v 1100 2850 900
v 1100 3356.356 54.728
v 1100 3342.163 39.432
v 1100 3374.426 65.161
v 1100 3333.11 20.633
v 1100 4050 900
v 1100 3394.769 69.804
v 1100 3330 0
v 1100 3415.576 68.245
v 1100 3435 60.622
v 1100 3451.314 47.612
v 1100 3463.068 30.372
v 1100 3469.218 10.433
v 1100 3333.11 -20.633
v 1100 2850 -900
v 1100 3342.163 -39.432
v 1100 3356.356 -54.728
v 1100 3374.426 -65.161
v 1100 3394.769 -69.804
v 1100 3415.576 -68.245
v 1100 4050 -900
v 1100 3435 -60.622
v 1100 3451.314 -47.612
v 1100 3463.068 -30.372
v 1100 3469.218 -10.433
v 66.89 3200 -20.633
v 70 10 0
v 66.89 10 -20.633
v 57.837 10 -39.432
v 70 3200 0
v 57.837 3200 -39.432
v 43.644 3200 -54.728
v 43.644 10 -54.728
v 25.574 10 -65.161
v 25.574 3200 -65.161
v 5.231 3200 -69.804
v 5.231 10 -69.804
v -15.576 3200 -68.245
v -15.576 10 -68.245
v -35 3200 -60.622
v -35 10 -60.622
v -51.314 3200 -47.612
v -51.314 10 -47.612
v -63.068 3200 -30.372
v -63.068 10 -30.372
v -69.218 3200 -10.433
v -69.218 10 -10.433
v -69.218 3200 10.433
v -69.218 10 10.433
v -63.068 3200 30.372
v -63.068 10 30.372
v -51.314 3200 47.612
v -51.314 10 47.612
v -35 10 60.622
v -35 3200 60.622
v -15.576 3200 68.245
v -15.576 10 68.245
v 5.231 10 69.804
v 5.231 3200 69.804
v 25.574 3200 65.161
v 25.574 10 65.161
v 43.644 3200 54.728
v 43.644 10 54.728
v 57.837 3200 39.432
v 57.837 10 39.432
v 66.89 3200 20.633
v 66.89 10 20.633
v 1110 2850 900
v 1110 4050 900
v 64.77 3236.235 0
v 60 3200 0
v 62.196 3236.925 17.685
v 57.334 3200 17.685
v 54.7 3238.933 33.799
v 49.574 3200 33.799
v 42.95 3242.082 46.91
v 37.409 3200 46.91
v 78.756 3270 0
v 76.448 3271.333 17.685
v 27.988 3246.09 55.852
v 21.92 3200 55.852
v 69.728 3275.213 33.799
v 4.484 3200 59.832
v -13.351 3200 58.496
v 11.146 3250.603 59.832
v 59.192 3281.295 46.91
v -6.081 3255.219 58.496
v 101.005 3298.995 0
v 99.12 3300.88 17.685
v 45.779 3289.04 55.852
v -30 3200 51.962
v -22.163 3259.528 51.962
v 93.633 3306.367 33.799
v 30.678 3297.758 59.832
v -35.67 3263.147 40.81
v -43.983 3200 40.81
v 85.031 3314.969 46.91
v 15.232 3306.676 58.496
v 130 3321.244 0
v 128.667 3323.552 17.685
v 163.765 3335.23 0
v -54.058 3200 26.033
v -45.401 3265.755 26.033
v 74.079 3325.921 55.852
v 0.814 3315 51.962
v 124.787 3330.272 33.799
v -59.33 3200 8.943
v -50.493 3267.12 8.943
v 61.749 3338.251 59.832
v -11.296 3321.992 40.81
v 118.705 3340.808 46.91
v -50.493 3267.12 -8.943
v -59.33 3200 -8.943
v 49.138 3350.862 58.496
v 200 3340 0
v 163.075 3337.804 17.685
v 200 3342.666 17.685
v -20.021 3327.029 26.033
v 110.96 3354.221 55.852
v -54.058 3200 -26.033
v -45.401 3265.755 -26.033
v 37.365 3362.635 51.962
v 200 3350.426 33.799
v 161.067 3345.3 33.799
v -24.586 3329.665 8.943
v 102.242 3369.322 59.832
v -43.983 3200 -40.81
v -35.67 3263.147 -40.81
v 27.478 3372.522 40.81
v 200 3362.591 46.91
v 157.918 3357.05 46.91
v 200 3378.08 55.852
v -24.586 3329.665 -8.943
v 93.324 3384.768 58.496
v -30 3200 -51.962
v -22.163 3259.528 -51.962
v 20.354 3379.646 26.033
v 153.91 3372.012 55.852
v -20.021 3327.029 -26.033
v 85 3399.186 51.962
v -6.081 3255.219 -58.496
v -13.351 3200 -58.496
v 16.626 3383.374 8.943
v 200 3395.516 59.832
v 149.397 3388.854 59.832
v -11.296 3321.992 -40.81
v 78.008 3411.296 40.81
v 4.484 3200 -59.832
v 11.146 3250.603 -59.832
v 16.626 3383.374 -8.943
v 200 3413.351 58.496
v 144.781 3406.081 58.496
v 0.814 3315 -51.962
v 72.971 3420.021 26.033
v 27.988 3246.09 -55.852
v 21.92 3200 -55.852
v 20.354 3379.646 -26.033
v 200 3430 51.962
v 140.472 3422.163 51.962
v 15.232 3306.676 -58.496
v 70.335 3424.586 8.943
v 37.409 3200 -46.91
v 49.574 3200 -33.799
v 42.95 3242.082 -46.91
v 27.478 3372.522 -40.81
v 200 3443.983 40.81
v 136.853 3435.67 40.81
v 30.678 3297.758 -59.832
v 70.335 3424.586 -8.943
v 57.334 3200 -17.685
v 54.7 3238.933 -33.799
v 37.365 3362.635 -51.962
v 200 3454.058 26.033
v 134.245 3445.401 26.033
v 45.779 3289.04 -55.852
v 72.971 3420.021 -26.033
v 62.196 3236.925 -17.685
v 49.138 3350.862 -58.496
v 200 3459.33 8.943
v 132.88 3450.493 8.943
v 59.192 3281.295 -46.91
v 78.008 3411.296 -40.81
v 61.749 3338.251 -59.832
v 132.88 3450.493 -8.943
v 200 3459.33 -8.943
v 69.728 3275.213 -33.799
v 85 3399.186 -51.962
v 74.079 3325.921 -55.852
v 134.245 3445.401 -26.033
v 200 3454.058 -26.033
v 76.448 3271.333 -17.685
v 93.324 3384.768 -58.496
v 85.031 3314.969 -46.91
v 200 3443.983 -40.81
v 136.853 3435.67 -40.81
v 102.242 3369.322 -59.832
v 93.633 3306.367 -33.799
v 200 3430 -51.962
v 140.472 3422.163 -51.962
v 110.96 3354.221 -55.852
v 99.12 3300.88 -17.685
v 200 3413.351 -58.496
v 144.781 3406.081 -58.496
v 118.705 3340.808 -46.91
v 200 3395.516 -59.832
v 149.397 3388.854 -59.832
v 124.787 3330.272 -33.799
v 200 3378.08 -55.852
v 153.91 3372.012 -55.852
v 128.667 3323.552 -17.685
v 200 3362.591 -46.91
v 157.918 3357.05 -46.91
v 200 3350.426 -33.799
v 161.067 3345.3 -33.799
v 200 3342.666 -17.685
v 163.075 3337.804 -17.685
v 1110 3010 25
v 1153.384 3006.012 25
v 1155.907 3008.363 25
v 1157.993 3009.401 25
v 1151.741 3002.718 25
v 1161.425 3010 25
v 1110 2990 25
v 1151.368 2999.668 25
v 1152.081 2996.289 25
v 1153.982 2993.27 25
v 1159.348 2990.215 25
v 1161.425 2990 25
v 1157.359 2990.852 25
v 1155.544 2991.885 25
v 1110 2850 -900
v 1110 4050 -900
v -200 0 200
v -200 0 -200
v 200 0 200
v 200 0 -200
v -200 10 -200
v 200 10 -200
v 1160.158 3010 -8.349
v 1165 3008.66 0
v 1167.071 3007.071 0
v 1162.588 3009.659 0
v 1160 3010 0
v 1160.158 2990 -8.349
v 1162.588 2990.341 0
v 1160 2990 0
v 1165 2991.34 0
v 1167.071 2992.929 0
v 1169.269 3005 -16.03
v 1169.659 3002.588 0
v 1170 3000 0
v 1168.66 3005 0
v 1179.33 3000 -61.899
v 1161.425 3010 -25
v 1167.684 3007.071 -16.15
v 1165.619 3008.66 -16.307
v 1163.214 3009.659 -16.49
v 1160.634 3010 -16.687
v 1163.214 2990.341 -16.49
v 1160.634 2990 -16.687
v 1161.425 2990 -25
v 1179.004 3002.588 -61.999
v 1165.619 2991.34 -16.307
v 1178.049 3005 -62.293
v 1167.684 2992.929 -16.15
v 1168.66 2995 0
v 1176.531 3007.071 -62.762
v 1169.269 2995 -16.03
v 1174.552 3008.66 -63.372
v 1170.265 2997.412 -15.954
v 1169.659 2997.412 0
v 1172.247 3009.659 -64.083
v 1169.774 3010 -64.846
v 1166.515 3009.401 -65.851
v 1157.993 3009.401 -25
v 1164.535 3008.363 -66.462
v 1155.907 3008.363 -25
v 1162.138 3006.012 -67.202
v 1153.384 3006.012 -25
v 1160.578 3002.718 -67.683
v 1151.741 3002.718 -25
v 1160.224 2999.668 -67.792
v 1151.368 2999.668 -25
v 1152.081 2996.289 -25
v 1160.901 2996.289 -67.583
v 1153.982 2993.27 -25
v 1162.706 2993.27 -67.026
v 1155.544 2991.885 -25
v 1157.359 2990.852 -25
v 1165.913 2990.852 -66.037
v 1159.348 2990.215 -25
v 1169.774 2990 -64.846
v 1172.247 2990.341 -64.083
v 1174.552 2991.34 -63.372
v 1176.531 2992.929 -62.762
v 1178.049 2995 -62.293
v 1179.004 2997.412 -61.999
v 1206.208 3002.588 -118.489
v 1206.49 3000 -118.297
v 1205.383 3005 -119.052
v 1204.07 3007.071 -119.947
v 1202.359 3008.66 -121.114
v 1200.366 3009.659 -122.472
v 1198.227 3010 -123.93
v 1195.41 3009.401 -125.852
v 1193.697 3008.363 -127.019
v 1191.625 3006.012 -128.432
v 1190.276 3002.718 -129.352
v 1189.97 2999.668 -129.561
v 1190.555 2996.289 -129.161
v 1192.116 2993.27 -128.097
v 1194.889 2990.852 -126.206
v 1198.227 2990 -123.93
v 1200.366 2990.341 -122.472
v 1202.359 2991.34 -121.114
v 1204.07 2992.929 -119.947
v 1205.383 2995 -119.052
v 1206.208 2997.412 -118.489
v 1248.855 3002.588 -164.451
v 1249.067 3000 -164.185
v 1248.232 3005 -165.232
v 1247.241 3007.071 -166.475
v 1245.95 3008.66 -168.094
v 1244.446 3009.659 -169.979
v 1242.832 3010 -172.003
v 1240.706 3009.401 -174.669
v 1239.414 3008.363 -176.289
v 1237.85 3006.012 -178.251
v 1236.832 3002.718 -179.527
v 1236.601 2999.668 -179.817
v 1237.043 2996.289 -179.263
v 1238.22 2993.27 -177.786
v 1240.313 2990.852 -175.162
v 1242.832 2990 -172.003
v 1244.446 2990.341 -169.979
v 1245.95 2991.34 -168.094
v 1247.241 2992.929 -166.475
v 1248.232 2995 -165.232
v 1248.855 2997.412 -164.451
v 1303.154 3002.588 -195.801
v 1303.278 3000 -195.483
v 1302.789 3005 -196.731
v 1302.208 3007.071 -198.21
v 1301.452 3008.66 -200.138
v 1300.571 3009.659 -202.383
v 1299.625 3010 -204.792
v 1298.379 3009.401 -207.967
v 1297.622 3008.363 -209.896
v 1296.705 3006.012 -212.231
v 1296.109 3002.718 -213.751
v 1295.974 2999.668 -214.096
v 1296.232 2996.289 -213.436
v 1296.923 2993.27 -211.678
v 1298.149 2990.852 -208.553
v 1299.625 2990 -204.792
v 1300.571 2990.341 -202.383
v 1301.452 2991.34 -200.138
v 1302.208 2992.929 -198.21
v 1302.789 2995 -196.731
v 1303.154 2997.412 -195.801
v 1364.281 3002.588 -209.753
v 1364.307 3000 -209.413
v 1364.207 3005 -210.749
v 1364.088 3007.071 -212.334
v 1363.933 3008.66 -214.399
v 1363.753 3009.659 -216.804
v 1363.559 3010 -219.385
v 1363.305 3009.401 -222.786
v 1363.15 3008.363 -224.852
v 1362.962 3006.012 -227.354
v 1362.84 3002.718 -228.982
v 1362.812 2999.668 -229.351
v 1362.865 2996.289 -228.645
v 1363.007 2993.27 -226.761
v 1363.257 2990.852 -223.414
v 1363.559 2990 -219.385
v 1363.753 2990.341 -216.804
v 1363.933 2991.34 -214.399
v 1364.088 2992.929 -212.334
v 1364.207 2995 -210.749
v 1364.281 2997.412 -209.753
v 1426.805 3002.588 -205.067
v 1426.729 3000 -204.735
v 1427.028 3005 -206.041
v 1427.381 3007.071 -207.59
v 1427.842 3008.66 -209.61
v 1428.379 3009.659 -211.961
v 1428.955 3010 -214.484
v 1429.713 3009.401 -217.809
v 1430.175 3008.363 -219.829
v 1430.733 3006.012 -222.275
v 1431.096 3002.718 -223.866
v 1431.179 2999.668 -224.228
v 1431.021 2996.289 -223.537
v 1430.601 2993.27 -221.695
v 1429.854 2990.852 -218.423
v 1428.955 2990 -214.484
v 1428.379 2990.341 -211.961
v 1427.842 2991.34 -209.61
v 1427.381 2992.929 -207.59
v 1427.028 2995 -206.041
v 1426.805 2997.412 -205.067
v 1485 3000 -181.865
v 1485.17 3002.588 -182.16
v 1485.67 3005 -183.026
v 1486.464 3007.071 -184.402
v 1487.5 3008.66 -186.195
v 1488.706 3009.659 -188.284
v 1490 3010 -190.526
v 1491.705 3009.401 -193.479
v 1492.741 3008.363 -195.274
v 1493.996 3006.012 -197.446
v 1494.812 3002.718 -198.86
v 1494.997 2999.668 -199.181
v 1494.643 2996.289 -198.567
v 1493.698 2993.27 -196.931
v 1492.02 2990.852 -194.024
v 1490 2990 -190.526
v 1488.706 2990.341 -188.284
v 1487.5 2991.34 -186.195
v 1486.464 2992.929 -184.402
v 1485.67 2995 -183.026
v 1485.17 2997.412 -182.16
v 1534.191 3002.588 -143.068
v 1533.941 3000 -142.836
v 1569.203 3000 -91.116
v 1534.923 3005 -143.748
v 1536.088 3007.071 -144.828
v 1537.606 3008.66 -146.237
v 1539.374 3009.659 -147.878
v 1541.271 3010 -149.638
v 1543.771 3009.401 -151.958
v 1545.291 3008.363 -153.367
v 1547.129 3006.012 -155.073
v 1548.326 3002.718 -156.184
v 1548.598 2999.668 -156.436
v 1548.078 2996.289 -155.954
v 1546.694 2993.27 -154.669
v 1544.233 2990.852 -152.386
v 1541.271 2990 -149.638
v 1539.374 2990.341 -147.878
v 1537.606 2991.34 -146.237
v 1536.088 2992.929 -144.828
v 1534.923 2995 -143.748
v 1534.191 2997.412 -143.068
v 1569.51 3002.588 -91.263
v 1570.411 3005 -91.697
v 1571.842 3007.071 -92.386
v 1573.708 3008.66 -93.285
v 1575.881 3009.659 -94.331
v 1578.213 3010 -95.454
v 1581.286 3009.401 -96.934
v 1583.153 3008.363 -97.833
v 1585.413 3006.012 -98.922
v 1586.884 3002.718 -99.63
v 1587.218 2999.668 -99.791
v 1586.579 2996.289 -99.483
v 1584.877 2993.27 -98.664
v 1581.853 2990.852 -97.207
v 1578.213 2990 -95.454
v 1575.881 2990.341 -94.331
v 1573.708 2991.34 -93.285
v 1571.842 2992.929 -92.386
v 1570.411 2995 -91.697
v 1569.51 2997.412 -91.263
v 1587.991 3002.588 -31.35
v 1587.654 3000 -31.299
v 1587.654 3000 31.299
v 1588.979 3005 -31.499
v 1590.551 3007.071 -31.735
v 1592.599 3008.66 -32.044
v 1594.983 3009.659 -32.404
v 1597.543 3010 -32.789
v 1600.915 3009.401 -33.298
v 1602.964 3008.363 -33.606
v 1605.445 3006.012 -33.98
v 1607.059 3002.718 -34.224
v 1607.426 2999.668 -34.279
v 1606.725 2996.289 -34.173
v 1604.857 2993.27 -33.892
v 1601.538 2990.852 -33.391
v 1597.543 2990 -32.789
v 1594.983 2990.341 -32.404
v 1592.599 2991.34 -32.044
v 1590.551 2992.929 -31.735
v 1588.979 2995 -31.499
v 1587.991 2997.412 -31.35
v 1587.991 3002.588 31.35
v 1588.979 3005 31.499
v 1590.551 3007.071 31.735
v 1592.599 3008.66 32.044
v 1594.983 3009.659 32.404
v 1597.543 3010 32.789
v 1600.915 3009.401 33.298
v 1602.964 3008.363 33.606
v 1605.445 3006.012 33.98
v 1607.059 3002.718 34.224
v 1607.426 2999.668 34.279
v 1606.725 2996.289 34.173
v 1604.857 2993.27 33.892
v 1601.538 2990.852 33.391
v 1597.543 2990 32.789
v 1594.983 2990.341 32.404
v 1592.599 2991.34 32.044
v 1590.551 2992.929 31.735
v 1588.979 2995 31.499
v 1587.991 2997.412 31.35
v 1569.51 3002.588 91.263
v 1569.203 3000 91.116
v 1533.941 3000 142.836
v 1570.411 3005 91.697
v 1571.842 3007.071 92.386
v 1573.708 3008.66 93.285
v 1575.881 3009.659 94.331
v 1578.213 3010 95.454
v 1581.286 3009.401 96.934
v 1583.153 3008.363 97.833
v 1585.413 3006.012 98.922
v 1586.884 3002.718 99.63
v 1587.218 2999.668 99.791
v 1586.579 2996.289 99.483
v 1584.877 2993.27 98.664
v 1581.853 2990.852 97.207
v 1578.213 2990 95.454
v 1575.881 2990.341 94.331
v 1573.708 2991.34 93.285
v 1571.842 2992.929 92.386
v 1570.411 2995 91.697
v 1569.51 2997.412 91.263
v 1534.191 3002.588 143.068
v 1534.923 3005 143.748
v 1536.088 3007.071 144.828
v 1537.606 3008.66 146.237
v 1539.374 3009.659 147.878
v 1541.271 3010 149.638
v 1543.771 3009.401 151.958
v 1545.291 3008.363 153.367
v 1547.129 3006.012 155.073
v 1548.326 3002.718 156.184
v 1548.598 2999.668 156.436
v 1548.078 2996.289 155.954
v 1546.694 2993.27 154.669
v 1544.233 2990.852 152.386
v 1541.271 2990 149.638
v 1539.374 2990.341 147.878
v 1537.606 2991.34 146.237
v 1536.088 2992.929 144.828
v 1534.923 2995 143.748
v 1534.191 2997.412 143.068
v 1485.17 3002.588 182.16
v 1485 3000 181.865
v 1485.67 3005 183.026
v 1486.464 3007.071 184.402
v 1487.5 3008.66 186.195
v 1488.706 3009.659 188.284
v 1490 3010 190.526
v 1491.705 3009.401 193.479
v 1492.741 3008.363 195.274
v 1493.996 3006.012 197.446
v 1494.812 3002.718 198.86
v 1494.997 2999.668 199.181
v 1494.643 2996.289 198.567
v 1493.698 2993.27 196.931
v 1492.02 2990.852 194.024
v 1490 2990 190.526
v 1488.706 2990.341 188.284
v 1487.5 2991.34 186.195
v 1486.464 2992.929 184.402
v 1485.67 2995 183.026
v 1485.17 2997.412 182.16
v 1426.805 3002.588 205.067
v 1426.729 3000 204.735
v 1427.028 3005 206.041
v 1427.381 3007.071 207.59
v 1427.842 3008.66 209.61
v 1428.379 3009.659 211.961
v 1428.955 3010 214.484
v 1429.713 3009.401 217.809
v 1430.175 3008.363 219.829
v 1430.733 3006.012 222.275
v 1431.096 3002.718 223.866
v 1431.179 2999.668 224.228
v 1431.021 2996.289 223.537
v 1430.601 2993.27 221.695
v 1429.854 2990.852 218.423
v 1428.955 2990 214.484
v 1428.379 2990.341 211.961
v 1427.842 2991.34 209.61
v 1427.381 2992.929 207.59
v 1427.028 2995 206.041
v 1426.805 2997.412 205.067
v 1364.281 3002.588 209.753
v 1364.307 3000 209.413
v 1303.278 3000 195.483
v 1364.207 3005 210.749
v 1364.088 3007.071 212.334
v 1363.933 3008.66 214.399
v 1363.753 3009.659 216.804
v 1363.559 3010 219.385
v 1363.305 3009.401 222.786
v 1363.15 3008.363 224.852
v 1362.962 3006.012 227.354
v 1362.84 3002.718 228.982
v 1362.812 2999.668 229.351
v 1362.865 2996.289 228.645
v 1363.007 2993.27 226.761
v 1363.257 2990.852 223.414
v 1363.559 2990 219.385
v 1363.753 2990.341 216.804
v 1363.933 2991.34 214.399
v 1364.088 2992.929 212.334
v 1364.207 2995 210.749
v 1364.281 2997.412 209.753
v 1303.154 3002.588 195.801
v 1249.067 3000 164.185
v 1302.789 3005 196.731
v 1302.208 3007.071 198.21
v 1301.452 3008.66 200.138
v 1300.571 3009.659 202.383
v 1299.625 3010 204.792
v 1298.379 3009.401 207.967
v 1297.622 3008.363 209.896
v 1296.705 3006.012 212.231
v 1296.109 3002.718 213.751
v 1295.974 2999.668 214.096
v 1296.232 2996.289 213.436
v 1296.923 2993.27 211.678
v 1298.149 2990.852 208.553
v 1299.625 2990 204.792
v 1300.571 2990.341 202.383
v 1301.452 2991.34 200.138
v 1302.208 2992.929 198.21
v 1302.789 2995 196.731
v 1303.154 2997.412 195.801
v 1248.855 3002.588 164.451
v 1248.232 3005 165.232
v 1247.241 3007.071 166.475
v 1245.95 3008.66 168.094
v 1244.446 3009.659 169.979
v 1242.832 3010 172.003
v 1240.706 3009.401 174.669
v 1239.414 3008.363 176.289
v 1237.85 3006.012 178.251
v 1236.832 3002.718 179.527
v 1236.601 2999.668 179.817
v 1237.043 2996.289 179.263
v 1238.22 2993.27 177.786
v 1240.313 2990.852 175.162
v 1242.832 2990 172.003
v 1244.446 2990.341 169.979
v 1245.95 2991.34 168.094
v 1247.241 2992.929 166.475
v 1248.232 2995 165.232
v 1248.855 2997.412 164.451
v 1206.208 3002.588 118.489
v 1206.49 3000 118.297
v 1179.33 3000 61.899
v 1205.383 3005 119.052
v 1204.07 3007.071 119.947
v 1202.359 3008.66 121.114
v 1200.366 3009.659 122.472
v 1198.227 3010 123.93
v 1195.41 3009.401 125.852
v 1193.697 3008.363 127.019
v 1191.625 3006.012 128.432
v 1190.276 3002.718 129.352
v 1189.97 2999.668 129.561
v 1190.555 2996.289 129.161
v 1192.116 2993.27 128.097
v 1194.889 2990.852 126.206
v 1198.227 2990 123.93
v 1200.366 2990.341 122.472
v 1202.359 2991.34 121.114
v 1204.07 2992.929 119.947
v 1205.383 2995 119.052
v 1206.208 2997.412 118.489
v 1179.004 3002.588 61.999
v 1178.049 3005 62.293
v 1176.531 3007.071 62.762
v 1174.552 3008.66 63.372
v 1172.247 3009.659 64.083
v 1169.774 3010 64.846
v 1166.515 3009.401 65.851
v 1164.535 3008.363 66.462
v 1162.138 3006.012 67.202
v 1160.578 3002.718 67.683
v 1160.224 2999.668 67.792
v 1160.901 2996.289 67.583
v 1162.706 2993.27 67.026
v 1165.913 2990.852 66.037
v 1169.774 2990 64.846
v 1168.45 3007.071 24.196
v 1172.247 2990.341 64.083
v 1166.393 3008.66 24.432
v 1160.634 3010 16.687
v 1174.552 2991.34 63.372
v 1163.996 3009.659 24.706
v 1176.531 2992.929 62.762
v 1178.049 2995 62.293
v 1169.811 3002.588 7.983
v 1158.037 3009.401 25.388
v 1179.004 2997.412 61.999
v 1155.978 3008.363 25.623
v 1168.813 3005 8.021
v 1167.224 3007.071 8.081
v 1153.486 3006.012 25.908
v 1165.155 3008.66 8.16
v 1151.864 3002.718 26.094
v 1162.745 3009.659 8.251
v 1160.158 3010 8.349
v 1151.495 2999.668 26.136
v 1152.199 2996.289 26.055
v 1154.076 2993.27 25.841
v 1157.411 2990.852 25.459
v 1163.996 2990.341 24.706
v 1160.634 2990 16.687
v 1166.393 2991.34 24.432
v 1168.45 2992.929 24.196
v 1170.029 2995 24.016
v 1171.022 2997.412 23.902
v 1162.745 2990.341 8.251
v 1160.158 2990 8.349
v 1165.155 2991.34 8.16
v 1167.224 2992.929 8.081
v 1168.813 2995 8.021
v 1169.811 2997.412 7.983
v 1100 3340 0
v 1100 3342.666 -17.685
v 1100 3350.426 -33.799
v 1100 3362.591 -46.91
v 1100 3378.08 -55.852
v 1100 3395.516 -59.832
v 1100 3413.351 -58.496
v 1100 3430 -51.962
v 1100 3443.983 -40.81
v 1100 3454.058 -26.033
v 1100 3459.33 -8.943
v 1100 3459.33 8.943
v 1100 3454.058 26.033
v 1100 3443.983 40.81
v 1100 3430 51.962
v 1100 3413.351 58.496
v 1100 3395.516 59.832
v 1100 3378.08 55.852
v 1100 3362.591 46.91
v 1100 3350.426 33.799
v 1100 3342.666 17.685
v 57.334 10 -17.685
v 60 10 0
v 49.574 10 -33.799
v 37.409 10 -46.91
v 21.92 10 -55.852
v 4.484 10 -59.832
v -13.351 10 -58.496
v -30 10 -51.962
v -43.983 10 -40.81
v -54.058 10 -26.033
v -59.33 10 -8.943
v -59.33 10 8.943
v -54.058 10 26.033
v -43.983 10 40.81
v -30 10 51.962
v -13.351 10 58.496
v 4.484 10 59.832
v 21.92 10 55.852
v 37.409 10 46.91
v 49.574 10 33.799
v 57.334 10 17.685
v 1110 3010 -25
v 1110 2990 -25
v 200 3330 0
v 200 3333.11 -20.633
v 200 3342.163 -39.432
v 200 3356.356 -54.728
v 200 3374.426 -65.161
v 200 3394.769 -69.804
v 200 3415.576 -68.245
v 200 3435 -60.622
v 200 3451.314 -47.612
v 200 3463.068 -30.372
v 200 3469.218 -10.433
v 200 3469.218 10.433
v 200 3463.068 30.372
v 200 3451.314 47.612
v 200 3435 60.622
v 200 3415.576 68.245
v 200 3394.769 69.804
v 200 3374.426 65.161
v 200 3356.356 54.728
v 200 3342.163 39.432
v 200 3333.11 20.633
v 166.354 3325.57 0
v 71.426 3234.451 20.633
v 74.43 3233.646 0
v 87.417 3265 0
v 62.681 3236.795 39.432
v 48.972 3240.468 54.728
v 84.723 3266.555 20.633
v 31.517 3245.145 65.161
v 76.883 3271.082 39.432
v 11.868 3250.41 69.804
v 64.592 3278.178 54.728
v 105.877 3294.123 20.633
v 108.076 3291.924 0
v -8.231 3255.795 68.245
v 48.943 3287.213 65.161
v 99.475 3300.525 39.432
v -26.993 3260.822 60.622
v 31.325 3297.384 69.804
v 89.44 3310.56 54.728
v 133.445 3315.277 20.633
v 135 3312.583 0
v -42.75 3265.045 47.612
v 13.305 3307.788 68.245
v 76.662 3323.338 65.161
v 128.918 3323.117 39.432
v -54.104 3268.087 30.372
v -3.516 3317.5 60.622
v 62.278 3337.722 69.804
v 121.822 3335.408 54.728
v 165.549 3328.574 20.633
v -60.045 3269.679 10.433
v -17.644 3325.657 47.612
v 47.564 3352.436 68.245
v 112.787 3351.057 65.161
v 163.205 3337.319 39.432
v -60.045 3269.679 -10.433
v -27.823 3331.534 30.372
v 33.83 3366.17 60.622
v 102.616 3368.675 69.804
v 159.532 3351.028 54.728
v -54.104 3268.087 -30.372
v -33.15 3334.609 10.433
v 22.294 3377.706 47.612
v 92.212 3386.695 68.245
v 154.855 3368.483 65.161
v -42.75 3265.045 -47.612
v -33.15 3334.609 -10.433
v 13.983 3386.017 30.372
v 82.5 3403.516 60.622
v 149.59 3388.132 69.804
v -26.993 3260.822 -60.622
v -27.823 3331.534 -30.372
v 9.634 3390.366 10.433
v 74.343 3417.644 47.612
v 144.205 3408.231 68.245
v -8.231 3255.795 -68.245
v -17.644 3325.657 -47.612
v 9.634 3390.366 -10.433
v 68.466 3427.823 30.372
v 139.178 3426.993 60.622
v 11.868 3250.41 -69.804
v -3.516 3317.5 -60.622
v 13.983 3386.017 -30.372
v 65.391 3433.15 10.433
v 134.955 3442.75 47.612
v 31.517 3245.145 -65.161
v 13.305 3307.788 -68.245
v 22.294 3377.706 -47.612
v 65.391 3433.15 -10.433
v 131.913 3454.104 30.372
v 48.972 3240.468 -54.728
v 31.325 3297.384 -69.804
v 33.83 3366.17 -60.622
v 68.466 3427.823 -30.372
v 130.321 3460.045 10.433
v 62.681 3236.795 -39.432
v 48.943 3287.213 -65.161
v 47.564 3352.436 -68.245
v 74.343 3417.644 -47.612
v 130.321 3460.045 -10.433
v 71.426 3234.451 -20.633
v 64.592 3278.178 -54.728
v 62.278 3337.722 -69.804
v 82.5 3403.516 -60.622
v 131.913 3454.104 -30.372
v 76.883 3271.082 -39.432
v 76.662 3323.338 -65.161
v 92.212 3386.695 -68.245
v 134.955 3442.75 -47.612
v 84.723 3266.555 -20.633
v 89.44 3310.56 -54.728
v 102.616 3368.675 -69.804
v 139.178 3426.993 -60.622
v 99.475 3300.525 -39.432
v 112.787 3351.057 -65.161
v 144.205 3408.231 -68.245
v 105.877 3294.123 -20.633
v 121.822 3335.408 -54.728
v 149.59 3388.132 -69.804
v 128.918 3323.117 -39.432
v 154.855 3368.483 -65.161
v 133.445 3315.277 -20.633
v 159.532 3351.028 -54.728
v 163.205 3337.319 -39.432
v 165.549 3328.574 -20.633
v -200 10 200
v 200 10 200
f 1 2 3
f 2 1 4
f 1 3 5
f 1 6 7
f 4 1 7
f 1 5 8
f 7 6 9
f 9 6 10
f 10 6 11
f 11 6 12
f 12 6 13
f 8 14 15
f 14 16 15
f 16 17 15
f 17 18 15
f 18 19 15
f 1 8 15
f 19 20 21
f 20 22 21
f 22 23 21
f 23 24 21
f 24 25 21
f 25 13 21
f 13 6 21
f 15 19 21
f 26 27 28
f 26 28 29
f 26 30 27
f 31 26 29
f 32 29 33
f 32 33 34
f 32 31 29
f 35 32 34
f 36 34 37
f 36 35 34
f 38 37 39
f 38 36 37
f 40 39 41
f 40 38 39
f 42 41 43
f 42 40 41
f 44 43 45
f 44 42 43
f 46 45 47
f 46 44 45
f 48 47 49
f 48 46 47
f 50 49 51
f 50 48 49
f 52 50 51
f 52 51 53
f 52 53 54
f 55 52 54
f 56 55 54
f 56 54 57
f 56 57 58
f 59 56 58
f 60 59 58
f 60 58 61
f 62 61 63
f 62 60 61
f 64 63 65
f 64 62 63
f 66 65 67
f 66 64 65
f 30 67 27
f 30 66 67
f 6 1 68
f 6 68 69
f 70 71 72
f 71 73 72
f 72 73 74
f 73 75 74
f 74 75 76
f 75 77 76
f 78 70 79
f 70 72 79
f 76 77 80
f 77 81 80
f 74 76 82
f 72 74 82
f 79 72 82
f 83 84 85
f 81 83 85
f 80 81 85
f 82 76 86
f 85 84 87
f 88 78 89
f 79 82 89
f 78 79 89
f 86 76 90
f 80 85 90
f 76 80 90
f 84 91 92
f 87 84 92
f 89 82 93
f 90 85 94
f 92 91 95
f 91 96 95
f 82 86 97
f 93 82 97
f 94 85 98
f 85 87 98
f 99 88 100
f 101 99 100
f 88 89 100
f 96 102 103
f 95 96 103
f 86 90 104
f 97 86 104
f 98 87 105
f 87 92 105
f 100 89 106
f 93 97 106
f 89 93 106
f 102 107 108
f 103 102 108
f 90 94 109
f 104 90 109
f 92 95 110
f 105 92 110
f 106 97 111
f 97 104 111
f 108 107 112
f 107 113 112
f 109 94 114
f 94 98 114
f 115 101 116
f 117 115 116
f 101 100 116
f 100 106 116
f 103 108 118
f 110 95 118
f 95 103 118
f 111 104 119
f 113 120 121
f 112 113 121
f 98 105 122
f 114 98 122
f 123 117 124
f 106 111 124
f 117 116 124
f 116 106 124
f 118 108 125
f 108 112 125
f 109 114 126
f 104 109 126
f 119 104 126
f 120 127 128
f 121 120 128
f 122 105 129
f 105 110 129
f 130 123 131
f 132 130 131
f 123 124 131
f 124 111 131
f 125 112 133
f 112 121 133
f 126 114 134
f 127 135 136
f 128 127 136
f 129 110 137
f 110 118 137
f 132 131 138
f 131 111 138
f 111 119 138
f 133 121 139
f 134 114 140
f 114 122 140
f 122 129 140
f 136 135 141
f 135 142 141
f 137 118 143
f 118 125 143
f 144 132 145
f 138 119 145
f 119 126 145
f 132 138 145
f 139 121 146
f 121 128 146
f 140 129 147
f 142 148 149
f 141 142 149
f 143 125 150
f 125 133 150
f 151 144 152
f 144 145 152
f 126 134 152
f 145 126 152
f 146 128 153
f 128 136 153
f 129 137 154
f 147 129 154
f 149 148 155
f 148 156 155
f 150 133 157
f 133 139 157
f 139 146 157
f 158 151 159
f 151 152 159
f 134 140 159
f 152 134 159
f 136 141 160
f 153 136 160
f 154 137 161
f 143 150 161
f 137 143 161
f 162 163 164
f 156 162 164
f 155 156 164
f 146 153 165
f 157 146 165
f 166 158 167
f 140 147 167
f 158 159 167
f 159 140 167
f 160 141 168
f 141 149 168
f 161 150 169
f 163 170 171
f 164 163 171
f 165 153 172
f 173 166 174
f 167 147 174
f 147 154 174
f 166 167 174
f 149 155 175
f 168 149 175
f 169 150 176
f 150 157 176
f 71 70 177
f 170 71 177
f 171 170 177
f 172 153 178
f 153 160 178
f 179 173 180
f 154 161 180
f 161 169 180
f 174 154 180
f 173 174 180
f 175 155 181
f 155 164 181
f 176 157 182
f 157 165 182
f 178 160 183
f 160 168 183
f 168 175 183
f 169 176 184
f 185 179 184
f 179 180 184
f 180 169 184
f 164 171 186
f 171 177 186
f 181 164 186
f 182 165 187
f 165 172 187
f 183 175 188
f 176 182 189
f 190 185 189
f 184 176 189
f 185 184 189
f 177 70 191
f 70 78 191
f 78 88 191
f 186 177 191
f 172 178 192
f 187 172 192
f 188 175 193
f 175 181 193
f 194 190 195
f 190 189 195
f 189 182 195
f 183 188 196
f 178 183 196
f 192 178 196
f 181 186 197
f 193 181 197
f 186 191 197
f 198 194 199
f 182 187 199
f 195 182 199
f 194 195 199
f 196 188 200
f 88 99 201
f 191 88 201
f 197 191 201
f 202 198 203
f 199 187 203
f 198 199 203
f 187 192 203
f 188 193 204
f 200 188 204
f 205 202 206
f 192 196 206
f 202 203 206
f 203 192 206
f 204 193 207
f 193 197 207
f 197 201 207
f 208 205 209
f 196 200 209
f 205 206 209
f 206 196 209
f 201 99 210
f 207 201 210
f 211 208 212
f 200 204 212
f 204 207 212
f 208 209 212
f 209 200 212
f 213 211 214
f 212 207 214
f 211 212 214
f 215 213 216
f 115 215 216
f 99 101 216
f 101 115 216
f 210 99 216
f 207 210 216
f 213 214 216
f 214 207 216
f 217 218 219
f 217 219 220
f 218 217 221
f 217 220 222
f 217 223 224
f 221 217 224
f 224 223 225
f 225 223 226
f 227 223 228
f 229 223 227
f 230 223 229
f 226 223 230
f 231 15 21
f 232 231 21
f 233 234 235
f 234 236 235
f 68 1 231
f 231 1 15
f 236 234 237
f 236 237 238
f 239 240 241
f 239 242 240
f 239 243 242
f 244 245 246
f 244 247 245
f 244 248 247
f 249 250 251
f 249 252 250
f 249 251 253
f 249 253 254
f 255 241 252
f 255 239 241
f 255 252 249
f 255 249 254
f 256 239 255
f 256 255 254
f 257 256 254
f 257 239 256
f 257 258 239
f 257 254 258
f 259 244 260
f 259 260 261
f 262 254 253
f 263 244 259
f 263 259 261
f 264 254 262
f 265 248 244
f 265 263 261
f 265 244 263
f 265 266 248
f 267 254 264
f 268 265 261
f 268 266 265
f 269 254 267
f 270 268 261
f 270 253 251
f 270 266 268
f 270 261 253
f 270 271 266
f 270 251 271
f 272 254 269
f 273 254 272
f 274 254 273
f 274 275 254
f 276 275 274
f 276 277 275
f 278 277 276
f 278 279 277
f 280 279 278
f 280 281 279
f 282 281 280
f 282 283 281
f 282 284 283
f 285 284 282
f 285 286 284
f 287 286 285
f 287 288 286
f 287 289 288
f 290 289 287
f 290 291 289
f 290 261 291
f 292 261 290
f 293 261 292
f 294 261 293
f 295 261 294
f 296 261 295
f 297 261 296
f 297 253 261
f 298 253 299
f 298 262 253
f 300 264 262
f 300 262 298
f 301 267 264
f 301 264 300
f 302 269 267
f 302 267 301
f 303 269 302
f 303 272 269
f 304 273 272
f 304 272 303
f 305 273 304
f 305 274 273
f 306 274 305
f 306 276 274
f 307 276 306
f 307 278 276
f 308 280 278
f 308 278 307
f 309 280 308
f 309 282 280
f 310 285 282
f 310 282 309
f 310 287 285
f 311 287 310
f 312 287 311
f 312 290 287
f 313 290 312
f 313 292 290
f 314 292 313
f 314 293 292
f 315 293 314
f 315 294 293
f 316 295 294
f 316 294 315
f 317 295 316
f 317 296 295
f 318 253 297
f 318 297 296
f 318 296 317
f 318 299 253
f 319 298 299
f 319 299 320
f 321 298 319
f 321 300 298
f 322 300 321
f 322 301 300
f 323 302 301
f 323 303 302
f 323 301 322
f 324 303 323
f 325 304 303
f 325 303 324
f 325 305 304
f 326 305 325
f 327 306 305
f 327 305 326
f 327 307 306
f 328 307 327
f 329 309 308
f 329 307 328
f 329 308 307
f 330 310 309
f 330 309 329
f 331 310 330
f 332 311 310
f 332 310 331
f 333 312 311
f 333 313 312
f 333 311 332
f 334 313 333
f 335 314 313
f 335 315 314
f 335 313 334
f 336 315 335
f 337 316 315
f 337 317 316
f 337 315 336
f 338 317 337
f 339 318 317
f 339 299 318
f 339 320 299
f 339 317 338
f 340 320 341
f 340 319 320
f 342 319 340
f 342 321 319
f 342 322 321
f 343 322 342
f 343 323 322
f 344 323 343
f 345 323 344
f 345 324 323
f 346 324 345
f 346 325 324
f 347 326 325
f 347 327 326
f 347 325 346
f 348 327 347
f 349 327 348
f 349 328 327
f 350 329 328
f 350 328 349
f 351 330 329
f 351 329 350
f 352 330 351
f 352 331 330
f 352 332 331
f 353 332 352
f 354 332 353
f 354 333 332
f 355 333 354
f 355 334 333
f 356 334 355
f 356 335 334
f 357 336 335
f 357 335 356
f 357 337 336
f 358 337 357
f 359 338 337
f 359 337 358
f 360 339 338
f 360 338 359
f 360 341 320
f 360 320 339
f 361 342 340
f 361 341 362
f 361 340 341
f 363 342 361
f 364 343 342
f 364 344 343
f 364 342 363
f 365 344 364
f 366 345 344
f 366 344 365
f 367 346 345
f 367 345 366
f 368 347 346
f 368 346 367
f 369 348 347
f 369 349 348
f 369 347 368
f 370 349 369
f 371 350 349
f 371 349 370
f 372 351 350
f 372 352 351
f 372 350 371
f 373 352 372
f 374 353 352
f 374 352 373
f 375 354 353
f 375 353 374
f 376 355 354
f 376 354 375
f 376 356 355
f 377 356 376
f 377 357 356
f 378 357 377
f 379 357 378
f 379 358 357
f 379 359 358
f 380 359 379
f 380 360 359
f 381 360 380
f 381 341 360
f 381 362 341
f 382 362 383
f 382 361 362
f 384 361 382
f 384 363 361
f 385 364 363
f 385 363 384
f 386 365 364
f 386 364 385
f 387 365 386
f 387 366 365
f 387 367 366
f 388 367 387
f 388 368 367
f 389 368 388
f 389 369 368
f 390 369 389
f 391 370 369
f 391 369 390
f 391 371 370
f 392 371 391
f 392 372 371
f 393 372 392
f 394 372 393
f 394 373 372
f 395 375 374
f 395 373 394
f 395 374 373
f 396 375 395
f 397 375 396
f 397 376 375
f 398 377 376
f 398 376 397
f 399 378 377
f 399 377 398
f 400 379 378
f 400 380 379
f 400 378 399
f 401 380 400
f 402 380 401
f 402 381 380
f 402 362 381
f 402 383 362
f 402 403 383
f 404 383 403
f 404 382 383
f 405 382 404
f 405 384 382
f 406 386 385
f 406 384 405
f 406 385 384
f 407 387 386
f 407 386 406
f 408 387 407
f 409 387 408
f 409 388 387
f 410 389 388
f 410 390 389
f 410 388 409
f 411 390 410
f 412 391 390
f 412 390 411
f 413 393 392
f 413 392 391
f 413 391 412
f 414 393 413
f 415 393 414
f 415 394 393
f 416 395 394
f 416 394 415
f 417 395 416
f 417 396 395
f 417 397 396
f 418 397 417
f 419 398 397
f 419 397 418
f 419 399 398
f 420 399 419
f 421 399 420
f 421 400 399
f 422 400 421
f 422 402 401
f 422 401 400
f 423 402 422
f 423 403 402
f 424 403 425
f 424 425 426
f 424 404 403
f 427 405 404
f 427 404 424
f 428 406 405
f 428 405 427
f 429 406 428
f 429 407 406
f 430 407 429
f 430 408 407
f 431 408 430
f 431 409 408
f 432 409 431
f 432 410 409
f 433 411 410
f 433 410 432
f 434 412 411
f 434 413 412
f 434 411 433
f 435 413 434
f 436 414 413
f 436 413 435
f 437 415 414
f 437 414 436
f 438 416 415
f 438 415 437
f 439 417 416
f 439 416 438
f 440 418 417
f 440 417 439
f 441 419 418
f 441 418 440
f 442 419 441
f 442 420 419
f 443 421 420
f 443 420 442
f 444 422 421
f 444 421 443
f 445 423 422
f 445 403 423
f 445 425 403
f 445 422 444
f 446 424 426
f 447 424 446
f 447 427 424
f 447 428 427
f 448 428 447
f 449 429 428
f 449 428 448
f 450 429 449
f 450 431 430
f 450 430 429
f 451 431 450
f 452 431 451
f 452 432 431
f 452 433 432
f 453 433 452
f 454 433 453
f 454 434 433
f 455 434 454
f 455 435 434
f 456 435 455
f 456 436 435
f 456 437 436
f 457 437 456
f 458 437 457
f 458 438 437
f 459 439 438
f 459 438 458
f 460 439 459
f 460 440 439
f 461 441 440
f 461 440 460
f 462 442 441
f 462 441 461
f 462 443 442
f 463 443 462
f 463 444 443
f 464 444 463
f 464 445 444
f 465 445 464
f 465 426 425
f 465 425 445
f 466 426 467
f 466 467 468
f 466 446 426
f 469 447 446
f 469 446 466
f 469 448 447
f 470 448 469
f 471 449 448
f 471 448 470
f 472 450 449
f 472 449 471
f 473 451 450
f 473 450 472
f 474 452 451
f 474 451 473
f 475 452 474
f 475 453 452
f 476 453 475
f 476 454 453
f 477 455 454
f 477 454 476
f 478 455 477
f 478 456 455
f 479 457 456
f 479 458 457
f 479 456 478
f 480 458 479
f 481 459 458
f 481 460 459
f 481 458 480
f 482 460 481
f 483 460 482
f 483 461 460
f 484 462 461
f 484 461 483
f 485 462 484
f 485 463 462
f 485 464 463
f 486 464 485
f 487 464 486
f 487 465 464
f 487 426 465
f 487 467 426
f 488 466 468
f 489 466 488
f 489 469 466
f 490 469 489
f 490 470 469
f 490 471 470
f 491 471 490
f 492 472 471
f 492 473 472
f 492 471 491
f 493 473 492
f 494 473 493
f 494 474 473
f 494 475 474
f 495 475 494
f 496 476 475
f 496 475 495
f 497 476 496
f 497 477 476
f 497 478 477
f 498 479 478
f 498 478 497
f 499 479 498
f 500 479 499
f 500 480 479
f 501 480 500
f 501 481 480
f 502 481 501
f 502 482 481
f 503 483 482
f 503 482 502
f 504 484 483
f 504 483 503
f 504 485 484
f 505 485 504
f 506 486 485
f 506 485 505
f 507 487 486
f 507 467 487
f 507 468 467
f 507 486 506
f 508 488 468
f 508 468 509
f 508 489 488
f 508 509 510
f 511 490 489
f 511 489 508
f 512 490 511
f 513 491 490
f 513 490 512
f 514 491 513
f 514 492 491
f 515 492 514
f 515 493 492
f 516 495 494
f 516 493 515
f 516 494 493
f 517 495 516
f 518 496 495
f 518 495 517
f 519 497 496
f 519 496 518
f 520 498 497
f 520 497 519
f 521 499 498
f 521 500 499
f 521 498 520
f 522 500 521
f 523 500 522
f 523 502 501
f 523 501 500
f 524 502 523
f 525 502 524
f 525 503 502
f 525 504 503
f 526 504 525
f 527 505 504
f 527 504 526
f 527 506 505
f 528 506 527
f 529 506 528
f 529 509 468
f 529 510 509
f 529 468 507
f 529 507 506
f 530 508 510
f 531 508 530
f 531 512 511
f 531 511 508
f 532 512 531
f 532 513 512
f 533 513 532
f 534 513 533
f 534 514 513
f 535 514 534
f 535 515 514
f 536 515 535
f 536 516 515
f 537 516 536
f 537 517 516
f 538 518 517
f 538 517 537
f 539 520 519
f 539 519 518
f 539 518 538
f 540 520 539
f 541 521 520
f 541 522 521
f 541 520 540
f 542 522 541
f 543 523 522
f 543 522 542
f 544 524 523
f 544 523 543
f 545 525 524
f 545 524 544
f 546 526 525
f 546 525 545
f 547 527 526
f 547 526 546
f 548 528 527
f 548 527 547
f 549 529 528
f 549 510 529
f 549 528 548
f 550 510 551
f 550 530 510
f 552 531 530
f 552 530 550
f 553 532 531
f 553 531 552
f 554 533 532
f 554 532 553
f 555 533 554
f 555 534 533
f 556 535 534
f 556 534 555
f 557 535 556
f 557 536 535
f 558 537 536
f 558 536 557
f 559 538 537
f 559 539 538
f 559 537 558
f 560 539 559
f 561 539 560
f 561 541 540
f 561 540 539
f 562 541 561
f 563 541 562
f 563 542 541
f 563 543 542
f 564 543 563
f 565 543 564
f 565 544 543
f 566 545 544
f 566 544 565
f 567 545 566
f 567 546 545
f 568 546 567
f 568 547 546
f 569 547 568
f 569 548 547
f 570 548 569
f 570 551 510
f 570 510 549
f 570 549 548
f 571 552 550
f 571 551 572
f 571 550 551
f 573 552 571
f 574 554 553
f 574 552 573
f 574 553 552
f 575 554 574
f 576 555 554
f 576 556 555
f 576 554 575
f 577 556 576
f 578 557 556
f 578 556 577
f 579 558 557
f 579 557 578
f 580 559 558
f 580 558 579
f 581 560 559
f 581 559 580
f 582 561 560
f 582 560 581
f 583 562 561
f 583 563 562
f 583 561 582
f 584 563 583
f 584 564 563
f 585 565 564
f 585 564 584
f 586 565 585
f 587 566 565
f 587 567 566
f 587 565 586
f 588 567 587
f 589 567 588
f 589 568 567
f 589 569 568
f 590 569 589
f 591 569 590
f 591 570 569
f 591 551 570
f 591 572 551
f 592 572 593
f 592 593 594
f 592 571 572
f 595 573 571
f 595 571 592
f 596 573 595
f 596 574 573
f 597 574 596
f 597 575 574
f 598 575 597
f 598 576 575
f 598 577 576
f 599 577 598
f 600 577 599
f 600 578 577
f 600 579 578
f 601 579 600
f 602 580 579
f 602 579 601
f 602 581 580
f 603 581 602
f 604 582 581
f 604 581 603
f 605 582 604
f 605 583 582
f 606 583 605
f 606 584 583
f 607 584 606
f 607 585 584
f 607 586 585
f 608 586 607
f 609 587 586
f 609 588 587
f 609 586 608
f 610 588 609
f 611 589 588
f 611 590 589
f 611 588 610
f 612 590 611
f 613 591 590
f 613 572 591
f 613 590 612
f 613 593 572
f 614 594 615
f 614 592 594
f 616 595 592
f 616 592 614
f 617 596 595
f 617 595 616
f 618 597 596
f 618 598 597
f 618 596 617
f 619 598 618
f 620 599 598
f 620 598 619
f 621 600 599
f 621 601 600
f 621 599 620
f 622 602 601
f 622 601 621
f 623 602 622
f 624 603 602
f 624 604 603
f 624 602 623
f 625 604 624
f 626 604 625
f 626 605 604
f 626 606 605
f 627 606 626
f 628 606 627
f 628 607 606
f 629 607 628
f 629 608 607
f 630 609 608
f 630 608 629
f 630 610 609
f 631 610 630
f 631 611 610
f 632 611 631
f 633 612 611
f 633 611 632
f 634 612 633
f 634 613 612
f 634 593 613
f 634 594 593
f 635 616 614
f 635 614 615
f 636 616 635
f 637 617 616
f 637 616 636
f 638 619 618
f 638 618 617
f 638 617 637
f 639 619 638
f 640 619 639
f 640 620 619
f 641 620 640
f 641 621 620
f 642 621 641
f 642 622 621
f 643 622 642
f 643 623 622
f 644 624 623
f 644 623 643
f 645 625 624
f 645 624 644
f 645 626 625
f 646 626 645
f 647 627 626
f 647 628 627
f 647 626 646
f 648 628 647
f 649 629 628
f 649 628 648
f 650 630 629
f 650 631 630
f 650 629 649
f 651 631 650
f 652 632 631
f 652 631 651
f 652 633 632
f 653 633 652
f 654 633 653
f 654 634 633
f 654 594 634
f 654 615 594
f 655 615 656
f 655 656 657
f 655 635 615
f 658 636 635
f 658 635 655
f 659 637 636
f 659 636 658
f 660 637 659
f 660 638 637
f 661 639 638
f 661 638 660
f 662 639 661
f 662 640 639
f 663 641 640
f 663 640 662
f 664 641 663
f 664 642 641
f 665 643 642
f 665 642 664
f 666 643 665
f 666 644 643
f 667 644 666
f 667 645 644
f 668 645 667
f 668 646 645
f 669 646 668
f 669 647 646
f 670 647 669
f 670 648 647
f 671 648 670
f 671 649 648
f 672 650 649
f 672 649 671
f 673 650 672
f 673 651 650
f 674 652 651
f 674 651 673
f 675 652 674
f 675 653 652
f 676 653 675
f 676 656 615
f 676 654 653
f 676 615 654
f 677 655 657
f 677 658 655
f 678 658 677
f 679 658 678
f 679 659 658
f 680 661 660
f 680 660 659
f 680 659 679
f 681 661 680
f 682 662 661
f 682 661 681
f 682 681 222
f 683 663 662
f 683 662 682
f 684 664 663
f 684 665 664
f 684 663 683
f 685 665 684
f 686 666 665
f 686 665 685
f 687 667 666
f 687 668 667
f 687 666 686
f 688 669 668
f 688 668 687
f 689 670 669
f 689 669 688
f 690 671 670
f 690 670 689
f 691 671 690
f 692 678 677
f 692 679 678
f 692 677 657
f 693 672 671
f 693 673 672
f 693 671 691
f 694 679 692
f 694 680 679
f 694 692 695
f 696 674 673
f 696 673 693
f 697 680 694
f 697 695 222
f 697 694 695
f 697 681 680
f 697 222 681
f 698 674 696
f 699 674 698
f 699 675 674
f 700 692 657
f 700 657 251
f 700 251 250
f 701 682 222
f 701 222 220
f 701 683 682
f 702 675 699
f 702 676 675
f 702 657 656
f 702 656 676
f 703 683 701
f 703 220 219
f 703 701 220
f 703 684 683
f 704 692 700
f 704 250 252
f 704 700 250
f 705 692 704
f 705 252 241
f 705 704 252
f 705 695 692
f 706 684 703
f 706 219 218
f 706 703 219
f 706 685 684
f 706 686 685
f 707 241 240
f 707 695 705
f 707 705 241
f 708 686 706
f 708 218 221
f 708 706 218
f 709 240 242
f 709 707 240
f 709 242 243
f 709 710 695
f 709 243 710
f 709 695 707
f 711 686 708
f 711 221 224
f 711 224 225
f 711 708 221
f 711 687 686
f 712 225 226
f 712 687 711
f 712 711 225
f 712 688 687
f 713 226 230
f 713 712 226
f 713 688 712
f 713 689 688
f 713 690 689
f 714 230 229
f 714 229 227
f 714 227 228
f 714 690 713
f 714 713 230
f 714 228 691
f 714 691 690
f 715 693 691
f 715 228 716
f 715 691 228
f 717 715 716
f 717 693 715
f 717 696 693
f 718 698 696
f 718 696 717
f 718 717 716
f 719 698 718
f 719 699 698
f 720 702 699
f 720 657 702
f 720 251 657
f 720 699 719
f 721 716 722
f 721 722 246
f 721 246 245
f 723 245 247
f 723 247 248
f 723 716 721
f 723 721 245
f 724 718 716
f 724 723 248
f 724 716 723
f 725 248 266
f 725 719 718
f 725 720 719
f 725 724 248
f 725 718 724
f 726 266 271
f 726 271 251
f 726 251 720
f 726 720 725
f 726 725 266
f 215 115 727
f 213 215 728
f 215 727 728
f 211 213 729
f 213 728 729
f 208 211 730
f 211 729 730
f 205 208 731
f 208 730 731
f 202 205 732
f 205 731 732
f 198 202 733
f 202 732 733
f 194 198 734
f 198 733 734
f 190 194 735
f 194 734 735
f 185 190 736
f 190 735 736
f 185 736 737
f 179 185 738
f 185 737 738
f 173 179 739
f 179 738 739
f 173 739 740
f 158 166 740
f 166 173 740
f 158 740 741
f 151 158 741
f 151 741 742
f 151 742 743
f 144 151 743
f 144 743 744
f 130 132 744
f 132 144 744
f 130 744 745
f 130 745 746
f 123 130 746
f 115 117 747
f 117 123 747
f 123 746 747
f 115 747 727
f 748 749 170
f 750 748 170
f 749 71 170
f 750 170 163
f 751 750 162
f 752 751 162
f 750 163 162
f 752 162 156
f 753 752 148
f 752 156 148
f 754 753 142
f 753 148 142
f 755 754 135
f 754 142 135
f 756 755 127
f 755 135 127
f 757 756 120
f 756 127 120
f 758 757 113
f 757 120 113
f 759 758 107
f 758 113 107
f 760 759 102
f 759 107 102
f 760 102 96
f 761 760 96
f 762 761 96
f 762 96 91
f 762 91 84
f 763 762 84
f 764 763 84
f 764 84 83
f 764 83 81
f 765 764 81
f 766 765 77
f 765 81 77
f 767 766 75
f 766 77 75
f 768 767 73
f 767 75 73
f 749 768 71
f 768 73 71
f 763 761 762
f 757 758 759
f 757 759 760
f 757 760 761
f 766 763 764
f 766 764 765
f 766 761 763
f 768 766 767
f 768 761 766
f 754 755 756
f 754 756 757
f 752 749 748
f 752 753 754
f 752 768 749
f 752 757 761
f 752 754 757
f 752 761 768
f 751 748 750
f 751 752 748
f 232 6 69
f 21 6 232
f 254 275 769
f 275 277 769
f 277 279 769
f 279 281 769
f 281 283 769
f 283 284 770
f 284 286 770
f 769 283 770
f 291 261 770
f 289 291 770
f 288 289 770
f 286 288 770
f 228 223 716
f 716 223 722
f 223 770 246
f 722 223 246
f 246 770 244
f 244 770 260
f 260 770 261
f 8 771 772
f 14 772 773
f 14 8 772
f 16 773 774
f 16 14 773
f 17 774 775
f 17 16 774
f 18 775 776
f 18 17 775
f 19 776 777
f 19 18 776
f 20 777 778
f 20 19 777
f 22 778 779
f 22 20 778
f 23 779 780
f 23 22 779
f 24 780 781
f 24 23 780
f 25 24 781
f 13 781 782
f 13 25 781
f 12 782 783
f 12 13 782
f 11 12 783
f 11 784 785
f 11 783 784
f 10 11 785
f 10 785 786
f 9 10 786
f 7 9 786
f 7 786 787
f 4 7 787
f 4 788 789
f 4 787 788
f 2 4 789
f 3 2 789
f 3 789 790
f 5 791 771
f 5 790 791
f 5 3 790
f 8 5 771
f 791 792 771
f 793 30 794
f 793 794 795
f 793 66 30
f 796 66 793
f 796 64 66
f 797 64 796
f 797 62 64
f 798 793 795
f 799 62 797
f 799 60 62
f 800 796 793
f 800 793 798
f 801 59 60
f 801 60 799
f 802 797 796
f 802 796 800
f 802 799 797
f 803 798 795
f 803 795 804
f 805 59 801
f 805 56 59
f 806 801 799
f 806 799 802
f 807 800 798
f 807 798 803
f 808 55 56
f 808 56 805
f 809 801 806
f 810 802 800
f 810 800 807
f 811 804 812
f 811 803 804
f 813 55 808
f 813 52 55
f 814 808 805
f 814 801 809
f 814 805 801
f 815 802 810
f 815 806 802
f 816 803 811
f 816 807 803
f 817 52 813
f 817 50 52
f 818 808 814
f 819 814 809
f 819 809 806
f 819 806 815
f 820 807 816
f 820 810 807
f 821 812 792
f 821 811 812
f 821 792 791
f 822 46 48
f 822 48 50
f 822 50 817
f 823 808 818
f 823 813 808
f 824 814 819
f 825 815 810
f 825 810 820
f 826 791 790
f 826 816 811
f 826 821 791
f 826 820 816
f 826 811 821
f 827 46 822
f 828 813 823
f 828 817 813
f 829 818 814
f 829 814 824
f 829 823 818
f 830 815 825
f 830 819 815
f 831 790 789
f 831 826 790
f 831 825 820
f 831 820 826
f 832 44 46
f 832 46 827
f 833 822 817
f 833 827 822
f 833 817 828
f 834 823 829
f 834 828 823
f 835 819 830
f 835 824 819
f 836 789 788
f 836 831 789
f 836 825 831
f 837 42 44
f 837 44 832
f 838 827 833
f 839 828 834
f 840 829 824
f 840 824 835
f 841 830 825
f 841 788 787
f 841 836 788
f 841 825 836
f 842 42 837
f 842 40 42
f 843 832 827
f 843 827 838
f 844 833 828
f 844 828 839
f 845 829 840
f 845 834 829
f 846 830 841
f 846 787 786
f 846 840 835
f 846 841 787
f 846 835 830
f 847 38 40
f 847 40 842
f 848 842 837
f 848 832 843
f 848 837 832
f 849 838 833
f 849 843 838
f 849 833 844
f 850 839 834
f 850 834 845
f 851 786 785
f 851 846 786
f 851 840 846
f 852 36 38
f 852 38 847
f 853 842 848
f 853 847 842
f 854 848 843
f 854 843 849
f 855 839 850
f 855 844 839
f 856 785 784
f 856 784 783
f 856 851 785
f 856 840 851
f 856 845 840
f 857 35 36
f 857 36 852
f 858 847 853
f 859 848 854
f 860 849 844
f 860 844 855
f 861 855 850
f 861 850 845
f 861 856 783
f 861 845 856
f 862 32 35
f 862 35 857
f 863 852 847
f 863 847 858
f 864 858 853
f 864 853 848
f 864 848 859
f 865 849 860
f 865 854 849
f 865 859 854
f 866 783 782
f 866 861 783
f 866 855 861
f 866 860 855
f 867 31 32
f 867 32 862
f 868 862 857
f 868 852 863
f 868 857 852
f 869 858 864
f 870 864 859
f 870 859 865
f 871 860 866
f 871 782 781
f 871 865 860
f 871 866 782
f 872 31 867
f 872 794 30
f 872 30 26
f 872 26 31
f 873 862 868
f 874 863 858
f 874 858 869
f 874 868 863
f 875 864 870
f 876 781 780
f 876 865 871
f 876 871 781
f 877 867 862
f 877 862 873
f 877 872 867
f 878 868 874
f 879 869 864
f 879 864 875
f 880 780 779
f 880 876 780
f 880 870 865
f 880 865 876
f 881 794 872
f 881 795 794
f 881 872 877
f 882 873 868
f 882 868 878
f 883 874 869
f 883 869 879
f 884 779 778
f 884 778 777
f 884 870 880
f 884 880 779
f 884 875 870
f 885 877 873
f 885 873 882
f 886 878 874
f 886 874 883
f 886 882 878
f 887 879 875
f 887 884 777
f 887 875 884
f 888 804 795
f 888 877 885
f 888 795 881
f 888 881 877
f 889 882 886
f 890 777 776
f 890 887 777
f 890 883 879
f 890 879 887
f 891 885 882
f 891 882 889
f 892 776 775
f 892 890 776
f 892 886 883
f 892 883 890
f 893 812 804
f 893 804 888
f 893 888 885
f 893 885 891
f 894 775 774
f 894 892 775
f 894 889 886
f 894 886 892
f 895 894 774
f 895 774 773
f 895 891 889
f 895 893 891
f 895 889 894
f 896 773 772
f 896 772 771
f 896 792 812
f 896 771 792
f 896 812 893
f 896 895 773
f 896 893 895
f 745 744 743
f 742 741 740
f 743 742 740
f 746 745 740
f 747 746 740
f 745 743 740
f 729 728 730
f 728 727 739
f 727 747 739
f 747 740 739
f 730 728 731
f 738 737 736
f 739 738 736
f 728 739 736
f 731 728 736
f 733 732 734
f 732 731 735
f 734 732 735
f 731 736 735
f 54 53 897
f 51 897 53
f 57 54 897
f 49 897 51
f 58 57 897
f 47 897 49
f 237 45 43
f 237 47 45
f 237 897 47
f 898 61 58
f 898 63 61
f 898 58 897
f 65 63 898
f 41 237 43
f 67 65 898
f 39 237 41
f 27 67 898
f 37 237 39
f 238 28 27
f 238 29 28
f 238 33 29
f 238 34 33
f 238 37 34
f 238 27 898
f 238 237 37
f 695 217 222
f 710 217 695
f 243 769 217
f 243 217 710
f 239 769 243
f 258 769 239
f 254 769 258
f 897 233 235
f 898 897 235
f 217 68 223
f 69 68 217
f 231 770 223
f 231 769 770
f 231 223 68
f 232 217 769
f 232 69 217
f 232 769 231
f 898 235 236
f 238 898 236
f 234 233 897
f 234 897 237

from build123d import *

# Parameters (mm, degrees)
IZIM1_W                     = 400
IZIM1_H                     = 400
Y_KSEKLIK_EKSTR_ZYON1_DEPTH = 10
IZIM2_R                     = 70
IZIM2_R_2                   = 60
IZIM5_W                     = 1800
IZIM5_H                     = 1200
Y_KSEKLIK_EKSTR_ZYON2_DEPTH = 10
IZIM11_R                    = 10
Y_KSEKLIK_EKSTR_ZYON6_START = 2990
Y_KSEKLIK_EKSTR_ZYON6_DEPTH = 20


with BuildPart() as part:
    # Çizim1 → Yükseklik-Ekstrüzyon1 (new body)
    with BuildSketch(Plane(origin=(0, 0, 0), x_dir=(1, 0, 0), z_dir=(0, 1, 0))):
        Rectangle(IZIM1_W, IZIM1_H)
    extrude(amount=Y_KSEKLIK_EKSTR_ZYON1_DEPTH)

    # Süpür1: sweep along a path in Çizim3
    with BuildLine(Plane.XY) as s_p_r1_path:
        Line((0, 0), (0, 3200))
        ThreePointArc((0, 3200), (58.578643763, 3341.421356237), (200, 3400))
        Line((200, 3400), (1100, 3400))
    # Çizim2 → Süpür1 (sweep)
    with BuildSketch(Plane(origin=(0, 0, 0), x_dir=(1, 0, 0), z_dir=(0, 1, 0))):
        Circle(IZIM2_R)
        Circle(IZIM2_R_2, mode=Mode.SUBTRACT)
    sweep(path=s_p_r1_path.line)

    # Çizim5 → Yükseklik-Ekstrüzyon2 (add)
    with BuildSketch(Plane(origin=(1100, 0, 0), x_dir=(0, 0, -1), z_dir=(1, 0, 0))):
        with Locations((0, 3450)):
            Rectangle(IZIM5_W, IZIM5_H)
    extrude(amount=Y_KSEKLIK_EKSTR_ZYON2_DEPTH)



with BuildPart() as body_2:
    # Çizim11 → Döndür1 (revolve)
    with BuildSketch(Plane.XY):
        with Locations((1160, 3000)):
            Circle(IZIM11_R)
    revolve(axis=Axis((1380, 3213.20754823, 0), (0, -1, 0)))


with BuildPart() as part_1:
    add(part.part)

    add(body_2.part)  # Yükseklik-Ekstrüzyon6 merges body 2
    # Yükseklik-Ekstrüzyon6: read off the stored shape, not the designer's step
    # Yükseklik-Ekstrüzyon6 outline → Yükseklik-Ekstrüzyon6 (add)
    with BuildSketch(Plane(origin=(0, 0, 0), x_dir=(1, 0, 0), z_dir=(0, 1, 0)).offset(Y_KSEKLIK_EKSTR_ZYON6_START)):
        with BuildLine():
            Line((1110, -25), (1161.425070056, -25))
            ThreePointArc((1161.425070056, -25), (1160, 0), (1161.425070056, 25))
            Line((1161.425070056, 25), (1110, 25))
            Line((1110, 25), (1110, -25))
        make_face()
    extrude(amount=Y_KSEKLIK_EKSTR_ZYON6_DEPTH)


solid = part_1.part
